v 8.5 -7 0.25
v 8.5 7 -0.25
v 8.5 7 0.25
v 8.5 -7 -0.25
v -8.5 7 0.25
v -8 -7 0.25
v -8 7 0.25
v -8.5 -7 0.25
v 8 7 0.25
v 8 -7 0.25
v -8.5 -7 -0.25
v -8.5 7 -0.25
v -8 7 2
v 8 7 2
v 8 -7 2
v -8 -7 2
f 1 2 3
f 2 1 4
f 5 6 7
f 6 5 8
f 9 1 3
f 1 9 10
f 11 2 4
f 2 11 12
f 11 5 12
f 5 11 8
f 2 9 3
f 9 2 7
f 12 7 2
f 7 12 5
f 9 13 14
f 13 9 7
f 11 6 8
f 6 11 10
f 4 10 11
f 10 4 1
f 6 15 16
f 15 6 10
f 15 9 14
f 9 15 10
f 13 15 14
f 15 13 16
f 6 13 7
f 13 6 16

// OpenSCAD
cube1_x=17;
cube1_y=14;
cube1_z=0.5;
cube2_x=16;
cube2_y=cube1_y;
cube2_z=2;
border_thickness=3;
border_z=3;
drill_diameter=2;
drill_z=15;
$fn=50;

module bottomCube(){
cube([cube1_x,cube1_y,cube1_z],center=true);
}

module upperCube(){ //above bottom cube
translate([0,0,cube2_z/2]) cube([cube2_x,cube2_y,cube2_z],center=true);
}

bottomCube();
upperCube();
